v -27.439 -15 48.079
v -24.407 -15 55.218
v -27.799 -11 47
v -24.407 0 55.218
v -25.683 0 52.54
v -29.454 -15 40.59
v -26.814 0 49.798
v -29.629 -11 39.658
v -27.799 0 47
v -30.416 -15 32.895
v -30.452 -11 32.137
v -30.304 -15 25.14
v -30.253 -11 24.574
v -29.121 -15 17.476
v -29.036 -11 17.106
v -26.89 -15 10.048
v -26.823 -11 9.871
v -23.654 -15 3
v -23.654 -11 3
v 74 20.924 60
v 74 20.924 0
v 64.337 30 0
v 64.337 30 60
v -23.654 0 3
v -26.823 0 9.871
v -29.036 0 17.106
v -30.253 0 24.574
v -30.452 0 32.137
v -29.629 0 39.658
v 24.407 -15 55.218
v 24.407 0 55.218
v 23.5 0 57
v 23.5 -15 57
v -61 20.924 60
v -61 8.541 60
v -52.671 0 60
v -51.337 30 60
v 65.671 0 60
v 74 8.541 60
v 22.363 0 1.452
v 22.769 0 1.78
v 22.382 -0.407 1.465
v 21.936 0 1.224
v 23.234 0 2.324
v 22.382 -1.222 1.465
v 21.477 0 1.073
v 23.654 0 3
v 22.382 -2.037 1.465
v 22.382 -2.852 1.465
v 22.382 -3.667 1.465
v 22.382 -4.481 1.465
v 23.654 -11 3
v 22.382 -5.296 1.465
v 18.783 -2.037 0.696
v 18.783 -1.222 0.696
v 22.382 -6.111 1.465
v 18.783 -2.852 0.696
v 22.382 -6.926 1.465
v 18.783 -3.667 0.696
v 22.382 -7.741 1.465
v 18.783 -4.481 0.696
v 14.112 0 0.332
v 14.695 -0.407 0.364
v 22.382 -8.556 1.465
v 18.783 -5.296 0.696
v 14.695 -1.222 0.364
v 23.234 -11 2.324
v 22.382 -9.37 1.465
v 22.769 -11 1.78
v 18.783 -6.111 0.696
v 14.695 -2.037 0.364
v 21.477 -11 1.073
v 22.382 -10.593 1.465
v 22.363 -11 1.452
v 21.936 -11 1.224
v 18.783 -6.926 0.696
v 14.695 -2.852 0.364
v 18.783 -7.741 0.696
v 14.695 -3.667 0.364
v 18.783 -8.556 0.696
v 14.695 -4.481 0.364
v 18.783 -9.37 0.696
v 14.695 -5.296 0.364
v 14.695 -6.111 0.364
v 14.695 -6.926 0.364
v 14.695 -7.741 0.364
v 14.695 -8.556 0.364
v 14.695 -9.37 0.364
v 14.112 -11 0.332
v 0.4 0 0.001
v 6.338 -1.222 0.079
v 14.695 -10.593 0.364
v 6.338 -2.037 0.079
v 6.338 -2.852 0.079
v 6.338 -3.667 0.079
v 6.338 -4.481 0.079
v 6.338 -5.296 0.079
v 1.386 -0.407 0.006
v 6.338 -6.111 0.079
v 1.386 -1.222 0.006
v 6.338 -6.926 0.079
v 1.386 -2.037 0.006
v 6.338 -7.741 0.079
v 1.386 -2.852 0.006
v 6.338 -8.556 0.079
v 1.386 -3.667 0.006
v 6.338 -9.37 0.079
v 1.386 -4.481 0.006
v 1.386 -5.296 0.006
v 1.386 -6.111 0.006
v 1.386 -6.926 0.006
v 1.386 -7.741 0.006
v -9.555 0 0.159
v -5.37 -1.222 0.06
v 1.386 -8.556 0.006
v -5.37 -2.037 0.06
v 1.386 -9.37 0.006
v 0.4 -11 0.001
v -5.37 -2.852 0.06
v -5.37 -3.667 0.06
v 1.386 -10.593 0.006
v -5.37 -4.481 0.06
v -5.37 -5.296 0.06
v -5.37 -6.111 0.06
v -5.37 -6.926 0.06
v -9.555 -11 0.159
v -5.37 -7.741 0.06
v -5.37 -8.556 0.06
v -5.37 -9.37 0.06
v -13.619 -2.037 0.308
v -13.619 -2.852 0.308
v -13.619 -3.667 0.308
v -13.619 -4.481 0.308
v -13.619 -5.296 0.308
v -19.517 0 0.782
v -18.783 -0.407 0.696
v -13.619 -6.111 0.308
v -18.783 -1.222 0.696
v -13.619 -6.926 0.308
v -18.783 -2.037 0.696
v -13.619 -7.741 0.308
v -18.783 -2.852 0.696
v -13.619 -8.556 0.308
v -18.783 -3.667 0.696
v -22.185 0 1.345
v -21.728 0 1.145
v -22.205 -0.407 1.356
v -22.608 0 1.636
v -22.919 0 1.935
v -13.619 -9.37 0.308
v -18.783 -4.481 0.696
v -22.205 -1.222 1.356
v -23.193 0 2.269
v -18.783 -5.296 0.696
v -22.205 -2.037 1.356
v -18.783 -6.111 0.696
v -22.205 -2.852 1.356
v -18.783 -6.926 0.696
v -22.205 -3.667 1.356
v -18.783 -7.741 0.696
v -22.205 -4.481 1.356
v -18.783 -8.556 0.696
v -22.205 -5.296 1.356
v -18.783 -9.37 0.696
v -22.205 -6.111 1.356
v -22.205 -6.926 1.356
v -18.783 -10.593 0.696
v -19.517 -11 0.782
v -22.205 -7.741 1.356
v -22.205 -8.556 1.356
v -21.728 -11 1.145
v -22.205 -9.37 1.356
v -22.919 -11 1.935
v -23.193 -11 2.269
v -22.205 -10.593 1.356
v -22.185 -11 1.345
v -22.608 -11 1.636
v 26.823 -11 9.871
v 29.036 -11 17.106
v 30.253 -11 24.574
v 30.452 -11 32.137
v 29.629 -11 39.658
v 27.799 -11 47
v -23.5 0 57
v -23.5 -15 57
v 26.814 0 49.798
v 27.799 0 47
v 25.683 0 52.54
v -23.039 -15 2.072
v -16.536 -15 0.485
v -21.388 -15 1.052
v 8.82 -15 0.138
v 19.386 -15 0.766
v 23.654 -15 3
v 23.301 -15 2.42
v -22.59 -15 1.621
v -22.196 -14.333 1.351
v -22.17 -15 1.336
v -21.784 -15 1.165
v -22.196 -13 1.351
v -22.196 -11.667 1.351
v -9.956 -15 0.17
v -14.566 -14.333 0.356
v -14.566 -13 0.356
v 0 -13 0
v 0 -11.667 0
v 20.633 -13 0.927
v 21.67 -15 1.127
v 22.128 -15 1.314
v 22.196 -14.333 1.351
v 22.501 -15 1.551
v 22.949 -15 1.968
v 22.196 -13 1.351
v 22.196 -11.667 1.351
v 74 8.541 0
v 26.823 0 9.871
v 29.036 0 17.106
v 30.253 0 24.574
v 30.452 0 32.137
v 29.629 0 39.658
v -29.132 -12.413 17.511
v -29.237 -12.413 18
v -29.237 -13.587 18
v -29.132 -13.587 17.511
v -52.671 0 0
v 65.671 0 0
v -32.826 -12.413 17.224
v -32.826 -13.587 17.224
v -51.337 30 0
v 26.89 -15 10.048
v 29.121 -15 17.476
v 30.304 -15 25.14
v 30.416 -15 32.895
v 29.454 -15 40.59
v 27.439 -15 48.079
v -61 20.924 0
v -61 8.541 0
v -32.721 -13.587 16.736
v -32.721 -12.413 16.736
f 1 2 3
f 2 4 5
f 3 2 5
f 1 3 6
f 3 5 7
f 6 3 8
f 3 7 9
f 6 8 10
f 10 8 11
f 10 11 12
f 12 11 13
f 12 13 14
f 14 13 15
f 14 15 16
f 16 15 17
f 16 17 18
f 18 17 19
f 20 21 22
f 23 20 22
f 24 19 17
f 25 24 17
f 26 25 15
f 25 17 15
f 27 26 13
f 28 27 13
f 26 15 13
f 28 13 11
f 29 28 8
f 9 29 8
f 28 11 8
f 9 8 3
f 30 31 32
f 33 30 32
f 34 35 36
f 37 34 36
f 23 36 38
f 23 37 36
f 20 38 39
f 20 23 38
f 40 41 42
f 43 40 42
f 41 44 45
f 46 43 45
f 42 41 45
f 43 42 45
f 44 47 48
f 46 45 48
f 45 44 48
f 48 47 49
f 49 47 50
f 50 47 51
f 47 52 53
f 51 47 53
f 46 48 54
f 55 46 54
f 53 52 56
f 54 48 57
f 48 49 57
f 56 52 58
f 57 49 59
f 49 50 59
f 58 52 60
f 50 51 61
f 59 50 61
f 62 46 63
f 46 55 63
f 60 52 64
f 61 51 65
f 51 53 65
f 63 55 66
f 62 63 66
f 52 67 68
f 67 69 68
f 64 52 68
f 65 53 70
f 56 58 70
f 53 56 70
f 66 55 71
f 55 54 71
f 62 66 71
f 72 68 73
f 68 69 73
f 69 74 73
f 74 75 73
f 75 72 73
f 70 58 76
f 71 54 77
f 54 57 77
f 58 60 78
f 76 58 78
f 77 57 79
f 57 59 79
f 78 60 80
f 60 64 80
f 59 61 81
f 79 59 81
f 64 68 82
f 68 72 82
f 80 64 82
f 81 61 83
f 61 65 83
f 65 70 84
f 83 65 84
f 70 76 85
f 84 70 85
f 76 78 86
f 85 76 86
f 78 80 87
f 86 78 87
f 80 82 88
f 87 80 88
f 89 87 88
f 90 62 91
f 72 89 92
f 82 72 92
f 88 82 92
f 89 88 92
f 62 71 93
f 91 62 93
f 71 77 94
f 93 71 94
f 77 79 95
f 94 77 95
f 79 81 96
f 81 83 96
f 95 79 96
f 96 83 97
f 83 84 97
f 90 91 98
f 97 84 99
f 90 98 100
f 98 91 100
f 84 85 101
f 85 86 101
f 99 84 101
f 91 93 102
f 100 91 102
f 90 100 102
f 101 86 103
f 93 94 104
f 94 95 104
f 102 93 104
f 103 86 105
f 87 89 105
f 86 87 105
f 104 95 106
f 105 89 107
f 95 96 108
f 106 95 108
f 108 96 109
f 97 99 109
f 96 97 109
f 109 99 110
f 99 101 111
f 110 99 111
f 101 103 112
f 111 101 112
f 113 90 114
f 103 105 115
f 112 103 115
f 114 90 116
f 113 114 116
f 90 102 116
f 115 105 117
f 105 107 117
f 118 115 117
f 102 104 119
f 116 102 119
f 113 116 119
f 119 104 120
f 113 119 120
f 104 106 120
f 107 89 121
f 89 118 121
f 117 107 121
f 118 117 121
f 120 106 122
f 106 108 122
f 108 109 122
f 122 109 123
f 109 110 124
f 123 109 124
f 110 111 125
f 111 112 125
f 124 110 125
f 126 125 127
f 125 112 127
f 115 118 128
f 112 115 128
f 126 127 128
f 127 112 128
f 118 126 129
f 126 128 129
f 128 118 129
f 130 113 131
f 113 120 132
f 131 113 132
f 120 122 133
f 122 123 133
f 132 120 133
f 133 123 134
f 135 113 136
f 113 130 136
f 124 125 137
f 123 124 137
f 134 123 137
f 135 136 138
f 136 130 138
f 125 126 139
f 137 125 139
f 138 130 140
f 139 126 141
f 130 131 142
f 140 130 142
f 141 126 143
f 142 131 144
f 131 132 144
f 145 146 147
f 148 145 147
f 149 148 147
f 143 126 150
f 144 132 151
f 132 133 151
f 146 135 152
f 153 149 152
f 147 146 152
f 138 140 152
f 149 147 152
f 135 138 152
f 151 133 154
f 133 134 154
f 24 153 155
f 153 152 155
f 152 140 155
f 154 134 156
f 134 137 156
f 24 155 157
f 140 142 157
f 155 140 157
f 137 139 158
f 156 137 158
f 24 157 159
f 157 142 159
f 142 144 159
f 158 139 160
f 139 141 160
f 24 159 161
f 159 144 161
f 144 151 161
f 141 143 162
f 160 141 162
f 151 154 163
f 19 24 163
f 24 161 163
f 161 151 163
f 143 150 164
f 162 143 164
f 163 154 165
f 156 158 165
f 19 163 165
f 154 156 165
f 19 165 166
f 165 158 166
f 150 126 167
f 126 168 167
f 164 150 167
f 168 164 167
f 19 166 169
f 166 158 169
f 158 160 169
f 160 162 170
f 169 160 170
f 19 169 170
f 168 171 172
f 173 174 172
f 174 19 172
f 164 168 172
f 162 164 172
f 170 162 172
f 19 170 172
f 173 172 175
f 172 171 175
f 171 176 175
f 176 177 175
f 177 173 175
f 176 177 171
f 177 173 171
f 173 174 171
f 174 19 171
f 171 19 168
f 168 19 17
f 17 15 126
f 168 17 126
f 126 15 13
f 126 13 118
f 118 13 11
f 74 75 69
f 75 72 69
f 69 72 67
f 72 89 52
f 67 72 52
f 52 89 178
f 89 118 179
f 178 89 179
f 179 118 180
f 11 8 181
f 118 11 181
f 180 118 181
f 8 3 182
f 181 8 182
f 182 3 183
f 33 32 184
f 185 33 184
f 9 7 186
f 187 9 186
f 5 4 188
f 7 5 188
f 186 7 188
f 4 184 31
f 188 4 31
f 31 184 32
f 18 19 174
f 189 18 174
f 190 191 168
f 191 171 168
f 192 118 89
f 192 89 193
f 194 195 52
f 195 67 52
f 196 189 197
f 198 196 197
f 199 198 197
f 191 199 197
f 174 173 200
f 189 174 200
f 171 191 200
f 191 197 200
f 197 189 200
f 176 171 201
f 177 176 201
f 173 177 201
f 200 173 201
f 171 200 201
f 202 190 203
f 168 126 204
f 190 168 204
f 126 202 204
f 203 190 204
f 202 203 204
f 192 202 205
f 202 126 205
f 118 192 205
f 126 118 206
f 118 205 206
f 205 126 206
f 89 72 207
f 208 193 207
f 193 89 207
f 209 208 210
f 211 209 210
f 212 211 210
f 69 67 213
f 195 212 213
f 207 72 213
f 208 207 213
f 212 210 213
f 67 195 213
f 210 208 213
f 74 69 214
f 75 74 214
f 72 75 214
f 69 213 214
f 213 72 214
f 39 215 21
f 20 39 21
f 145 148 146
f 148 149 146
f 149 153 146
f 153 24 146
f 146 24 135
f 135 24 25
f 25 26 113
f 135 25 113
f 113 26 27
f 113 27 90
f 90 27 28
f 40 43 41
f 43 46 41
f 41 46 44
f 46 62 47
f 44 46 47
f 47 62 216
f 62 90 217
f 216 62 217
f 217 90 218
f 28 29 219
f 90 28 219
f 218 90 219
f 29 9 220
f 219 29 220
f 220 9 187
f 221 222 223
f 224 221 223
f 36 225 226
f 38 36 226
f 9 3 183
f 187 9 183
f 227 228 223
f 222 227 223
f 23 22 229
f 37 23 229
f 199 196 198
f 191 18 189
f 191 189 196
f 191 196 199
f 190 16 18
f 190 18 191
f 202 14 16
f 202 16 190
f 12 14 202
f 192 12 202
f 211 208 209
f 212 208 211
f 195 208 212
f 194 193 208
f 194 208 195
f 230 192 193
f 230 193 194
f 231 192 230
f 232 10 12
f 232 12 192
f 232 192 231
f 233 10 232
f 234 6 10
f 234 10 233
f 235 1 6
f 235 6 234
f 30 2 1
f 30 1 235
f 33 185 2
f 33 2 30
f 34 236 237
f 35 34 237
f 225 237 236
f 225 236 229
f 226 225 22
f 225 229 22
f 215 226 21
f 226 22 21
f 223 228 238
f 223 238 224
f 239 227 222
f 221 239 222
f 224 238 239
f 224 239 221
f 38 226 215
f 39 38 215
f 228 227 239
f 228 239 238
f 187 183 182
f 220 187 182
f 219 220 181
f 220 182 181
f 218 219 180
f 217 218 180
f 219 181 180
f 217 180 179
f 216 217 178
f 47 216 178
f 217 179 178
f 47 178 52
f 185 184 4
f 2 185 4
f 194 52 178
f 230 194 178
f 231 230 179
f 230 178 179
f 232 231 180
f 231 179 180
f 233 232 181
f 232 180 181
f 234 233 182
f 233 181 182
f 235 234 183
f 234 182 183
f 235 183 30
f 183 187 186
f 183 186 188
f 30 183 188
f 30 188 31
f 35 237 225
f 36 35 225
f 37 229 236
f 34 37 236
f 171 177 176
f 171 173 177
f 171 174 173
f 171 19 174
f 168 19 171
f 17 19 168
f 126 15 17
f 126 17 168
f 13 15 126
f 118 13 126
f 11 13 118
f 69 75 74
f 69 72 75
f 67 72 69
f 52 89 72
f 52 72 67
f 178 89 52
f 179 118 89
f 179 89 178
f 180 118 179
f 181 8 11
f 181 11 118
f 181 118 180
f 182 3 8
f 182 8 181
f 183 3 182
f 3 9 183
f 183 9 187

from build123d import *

# Parameters (mm, degrees)
F1_DEPTH  = 60
F3_DEPTH  = 15
F4_W      = 87.3895585537
F4_H      = 47
F5_DEPTH  = 11
F6_DEPTH  = 11
F9_W      = 3.6720675271
F9_H      = 1.174679026
F10_DEPTH = 0.5


with BuildPart() as f1:
    # F0 (on Top) → F1 (new body)
    with BuildSketch(Plane.XY):
        Polygon((-61, 8.5412541542), (-52.6709560065, 0), (65.6709560065, 0), (74, 8.5412541542), (74, 20.9240532046), (64.3365685589, 30), (-51.3365685589, 30), (-61, 20.9240532046), align=None)
    extrude(amount=F1_DEPTH)


with BuildPart() as f3:
    # F2 (on face) → F3 (new body)
    with BuildSketch(Plane.XZ):
        with BuildLine():
            Line((0, 57), (-23.5, 57))
            Line((-23.5, 57), (-24.407419424, 55.2177009261))
            ThreePointArc((-24.407419424, 55.2177009261), (-30.4941821284, 29.01565487), (-23.6544745741, 3))
            add(Edge.make_bspline(
                [(-23.6544745741, 3), (-22.6799163941, 1.2150671741), (-20.5407792126, 0.9001688261), (-14.7933912038, 0.1811527802), (-2.7868645717, 0), (0, 0)],
                knots=[0, 0, 0, 0, 0.2334367272, 0.5344870424, 1, 1, 1, 1], degree=3))
            add(Edge.make_bspline(
                [(23.6544745741, 3), (22.6799163941, 1.2150671741), (20.5407792126, 0.9001688261), (14.7933912038, 0.1811527802), (2.7868645717, 0), (0, 0)],
                knots=[0, 0, 0, 0, 0.2334367272, 0.5344870424, 1, 1, 1, 1], degree=3))
            ThreePointArc((23.6544745741, 3), (30.4941821284, 29.01565487), (24.407419424, 55.2177009261))
            Line((24.407419424, 55.2177009261), (23.5, 57))
            Line((23.5, 57), (0, 57))
        make_face()
    extrude(amount=F3_DEPTH)

    # F4 (on face) → F5 (cut)
    with BuildSketch(Plane.XZ):
        with Locations((3.2228827477, 23.5)):
            Rectangle(F4_W, F4_H)
    extrude(amount=F5_DEPTH, mode=Mode.SUBTRACT)


with BuildPart() as f6:
    # F6 (new): a face of the model
    f6_faces = [f3.part.faces().sort_by_distance(p)[0] for p in [
        (0, -11, 24.4159360274),
    ]]
    extrude(f6_faces, amount=F6_DEPTH)


with BuildPart() as f10:
    # F9 (on face) → F10 (new body)
    with BuildSketch(Plane(origin=(-5.0206895731, 0, 23.2331749697), x_dir=(0.9774376194, 0, 0.211224289), z_dir=(0.211224289, 0, -0.9774376194))):
        with Locations((-26.6114750484, 13)):
            Rectangle(F9_W, F9_H)
    extrude(amount=F10_DEPTH)


solid = Compound([f1.part, f3.part, f6.part, f10.part])
